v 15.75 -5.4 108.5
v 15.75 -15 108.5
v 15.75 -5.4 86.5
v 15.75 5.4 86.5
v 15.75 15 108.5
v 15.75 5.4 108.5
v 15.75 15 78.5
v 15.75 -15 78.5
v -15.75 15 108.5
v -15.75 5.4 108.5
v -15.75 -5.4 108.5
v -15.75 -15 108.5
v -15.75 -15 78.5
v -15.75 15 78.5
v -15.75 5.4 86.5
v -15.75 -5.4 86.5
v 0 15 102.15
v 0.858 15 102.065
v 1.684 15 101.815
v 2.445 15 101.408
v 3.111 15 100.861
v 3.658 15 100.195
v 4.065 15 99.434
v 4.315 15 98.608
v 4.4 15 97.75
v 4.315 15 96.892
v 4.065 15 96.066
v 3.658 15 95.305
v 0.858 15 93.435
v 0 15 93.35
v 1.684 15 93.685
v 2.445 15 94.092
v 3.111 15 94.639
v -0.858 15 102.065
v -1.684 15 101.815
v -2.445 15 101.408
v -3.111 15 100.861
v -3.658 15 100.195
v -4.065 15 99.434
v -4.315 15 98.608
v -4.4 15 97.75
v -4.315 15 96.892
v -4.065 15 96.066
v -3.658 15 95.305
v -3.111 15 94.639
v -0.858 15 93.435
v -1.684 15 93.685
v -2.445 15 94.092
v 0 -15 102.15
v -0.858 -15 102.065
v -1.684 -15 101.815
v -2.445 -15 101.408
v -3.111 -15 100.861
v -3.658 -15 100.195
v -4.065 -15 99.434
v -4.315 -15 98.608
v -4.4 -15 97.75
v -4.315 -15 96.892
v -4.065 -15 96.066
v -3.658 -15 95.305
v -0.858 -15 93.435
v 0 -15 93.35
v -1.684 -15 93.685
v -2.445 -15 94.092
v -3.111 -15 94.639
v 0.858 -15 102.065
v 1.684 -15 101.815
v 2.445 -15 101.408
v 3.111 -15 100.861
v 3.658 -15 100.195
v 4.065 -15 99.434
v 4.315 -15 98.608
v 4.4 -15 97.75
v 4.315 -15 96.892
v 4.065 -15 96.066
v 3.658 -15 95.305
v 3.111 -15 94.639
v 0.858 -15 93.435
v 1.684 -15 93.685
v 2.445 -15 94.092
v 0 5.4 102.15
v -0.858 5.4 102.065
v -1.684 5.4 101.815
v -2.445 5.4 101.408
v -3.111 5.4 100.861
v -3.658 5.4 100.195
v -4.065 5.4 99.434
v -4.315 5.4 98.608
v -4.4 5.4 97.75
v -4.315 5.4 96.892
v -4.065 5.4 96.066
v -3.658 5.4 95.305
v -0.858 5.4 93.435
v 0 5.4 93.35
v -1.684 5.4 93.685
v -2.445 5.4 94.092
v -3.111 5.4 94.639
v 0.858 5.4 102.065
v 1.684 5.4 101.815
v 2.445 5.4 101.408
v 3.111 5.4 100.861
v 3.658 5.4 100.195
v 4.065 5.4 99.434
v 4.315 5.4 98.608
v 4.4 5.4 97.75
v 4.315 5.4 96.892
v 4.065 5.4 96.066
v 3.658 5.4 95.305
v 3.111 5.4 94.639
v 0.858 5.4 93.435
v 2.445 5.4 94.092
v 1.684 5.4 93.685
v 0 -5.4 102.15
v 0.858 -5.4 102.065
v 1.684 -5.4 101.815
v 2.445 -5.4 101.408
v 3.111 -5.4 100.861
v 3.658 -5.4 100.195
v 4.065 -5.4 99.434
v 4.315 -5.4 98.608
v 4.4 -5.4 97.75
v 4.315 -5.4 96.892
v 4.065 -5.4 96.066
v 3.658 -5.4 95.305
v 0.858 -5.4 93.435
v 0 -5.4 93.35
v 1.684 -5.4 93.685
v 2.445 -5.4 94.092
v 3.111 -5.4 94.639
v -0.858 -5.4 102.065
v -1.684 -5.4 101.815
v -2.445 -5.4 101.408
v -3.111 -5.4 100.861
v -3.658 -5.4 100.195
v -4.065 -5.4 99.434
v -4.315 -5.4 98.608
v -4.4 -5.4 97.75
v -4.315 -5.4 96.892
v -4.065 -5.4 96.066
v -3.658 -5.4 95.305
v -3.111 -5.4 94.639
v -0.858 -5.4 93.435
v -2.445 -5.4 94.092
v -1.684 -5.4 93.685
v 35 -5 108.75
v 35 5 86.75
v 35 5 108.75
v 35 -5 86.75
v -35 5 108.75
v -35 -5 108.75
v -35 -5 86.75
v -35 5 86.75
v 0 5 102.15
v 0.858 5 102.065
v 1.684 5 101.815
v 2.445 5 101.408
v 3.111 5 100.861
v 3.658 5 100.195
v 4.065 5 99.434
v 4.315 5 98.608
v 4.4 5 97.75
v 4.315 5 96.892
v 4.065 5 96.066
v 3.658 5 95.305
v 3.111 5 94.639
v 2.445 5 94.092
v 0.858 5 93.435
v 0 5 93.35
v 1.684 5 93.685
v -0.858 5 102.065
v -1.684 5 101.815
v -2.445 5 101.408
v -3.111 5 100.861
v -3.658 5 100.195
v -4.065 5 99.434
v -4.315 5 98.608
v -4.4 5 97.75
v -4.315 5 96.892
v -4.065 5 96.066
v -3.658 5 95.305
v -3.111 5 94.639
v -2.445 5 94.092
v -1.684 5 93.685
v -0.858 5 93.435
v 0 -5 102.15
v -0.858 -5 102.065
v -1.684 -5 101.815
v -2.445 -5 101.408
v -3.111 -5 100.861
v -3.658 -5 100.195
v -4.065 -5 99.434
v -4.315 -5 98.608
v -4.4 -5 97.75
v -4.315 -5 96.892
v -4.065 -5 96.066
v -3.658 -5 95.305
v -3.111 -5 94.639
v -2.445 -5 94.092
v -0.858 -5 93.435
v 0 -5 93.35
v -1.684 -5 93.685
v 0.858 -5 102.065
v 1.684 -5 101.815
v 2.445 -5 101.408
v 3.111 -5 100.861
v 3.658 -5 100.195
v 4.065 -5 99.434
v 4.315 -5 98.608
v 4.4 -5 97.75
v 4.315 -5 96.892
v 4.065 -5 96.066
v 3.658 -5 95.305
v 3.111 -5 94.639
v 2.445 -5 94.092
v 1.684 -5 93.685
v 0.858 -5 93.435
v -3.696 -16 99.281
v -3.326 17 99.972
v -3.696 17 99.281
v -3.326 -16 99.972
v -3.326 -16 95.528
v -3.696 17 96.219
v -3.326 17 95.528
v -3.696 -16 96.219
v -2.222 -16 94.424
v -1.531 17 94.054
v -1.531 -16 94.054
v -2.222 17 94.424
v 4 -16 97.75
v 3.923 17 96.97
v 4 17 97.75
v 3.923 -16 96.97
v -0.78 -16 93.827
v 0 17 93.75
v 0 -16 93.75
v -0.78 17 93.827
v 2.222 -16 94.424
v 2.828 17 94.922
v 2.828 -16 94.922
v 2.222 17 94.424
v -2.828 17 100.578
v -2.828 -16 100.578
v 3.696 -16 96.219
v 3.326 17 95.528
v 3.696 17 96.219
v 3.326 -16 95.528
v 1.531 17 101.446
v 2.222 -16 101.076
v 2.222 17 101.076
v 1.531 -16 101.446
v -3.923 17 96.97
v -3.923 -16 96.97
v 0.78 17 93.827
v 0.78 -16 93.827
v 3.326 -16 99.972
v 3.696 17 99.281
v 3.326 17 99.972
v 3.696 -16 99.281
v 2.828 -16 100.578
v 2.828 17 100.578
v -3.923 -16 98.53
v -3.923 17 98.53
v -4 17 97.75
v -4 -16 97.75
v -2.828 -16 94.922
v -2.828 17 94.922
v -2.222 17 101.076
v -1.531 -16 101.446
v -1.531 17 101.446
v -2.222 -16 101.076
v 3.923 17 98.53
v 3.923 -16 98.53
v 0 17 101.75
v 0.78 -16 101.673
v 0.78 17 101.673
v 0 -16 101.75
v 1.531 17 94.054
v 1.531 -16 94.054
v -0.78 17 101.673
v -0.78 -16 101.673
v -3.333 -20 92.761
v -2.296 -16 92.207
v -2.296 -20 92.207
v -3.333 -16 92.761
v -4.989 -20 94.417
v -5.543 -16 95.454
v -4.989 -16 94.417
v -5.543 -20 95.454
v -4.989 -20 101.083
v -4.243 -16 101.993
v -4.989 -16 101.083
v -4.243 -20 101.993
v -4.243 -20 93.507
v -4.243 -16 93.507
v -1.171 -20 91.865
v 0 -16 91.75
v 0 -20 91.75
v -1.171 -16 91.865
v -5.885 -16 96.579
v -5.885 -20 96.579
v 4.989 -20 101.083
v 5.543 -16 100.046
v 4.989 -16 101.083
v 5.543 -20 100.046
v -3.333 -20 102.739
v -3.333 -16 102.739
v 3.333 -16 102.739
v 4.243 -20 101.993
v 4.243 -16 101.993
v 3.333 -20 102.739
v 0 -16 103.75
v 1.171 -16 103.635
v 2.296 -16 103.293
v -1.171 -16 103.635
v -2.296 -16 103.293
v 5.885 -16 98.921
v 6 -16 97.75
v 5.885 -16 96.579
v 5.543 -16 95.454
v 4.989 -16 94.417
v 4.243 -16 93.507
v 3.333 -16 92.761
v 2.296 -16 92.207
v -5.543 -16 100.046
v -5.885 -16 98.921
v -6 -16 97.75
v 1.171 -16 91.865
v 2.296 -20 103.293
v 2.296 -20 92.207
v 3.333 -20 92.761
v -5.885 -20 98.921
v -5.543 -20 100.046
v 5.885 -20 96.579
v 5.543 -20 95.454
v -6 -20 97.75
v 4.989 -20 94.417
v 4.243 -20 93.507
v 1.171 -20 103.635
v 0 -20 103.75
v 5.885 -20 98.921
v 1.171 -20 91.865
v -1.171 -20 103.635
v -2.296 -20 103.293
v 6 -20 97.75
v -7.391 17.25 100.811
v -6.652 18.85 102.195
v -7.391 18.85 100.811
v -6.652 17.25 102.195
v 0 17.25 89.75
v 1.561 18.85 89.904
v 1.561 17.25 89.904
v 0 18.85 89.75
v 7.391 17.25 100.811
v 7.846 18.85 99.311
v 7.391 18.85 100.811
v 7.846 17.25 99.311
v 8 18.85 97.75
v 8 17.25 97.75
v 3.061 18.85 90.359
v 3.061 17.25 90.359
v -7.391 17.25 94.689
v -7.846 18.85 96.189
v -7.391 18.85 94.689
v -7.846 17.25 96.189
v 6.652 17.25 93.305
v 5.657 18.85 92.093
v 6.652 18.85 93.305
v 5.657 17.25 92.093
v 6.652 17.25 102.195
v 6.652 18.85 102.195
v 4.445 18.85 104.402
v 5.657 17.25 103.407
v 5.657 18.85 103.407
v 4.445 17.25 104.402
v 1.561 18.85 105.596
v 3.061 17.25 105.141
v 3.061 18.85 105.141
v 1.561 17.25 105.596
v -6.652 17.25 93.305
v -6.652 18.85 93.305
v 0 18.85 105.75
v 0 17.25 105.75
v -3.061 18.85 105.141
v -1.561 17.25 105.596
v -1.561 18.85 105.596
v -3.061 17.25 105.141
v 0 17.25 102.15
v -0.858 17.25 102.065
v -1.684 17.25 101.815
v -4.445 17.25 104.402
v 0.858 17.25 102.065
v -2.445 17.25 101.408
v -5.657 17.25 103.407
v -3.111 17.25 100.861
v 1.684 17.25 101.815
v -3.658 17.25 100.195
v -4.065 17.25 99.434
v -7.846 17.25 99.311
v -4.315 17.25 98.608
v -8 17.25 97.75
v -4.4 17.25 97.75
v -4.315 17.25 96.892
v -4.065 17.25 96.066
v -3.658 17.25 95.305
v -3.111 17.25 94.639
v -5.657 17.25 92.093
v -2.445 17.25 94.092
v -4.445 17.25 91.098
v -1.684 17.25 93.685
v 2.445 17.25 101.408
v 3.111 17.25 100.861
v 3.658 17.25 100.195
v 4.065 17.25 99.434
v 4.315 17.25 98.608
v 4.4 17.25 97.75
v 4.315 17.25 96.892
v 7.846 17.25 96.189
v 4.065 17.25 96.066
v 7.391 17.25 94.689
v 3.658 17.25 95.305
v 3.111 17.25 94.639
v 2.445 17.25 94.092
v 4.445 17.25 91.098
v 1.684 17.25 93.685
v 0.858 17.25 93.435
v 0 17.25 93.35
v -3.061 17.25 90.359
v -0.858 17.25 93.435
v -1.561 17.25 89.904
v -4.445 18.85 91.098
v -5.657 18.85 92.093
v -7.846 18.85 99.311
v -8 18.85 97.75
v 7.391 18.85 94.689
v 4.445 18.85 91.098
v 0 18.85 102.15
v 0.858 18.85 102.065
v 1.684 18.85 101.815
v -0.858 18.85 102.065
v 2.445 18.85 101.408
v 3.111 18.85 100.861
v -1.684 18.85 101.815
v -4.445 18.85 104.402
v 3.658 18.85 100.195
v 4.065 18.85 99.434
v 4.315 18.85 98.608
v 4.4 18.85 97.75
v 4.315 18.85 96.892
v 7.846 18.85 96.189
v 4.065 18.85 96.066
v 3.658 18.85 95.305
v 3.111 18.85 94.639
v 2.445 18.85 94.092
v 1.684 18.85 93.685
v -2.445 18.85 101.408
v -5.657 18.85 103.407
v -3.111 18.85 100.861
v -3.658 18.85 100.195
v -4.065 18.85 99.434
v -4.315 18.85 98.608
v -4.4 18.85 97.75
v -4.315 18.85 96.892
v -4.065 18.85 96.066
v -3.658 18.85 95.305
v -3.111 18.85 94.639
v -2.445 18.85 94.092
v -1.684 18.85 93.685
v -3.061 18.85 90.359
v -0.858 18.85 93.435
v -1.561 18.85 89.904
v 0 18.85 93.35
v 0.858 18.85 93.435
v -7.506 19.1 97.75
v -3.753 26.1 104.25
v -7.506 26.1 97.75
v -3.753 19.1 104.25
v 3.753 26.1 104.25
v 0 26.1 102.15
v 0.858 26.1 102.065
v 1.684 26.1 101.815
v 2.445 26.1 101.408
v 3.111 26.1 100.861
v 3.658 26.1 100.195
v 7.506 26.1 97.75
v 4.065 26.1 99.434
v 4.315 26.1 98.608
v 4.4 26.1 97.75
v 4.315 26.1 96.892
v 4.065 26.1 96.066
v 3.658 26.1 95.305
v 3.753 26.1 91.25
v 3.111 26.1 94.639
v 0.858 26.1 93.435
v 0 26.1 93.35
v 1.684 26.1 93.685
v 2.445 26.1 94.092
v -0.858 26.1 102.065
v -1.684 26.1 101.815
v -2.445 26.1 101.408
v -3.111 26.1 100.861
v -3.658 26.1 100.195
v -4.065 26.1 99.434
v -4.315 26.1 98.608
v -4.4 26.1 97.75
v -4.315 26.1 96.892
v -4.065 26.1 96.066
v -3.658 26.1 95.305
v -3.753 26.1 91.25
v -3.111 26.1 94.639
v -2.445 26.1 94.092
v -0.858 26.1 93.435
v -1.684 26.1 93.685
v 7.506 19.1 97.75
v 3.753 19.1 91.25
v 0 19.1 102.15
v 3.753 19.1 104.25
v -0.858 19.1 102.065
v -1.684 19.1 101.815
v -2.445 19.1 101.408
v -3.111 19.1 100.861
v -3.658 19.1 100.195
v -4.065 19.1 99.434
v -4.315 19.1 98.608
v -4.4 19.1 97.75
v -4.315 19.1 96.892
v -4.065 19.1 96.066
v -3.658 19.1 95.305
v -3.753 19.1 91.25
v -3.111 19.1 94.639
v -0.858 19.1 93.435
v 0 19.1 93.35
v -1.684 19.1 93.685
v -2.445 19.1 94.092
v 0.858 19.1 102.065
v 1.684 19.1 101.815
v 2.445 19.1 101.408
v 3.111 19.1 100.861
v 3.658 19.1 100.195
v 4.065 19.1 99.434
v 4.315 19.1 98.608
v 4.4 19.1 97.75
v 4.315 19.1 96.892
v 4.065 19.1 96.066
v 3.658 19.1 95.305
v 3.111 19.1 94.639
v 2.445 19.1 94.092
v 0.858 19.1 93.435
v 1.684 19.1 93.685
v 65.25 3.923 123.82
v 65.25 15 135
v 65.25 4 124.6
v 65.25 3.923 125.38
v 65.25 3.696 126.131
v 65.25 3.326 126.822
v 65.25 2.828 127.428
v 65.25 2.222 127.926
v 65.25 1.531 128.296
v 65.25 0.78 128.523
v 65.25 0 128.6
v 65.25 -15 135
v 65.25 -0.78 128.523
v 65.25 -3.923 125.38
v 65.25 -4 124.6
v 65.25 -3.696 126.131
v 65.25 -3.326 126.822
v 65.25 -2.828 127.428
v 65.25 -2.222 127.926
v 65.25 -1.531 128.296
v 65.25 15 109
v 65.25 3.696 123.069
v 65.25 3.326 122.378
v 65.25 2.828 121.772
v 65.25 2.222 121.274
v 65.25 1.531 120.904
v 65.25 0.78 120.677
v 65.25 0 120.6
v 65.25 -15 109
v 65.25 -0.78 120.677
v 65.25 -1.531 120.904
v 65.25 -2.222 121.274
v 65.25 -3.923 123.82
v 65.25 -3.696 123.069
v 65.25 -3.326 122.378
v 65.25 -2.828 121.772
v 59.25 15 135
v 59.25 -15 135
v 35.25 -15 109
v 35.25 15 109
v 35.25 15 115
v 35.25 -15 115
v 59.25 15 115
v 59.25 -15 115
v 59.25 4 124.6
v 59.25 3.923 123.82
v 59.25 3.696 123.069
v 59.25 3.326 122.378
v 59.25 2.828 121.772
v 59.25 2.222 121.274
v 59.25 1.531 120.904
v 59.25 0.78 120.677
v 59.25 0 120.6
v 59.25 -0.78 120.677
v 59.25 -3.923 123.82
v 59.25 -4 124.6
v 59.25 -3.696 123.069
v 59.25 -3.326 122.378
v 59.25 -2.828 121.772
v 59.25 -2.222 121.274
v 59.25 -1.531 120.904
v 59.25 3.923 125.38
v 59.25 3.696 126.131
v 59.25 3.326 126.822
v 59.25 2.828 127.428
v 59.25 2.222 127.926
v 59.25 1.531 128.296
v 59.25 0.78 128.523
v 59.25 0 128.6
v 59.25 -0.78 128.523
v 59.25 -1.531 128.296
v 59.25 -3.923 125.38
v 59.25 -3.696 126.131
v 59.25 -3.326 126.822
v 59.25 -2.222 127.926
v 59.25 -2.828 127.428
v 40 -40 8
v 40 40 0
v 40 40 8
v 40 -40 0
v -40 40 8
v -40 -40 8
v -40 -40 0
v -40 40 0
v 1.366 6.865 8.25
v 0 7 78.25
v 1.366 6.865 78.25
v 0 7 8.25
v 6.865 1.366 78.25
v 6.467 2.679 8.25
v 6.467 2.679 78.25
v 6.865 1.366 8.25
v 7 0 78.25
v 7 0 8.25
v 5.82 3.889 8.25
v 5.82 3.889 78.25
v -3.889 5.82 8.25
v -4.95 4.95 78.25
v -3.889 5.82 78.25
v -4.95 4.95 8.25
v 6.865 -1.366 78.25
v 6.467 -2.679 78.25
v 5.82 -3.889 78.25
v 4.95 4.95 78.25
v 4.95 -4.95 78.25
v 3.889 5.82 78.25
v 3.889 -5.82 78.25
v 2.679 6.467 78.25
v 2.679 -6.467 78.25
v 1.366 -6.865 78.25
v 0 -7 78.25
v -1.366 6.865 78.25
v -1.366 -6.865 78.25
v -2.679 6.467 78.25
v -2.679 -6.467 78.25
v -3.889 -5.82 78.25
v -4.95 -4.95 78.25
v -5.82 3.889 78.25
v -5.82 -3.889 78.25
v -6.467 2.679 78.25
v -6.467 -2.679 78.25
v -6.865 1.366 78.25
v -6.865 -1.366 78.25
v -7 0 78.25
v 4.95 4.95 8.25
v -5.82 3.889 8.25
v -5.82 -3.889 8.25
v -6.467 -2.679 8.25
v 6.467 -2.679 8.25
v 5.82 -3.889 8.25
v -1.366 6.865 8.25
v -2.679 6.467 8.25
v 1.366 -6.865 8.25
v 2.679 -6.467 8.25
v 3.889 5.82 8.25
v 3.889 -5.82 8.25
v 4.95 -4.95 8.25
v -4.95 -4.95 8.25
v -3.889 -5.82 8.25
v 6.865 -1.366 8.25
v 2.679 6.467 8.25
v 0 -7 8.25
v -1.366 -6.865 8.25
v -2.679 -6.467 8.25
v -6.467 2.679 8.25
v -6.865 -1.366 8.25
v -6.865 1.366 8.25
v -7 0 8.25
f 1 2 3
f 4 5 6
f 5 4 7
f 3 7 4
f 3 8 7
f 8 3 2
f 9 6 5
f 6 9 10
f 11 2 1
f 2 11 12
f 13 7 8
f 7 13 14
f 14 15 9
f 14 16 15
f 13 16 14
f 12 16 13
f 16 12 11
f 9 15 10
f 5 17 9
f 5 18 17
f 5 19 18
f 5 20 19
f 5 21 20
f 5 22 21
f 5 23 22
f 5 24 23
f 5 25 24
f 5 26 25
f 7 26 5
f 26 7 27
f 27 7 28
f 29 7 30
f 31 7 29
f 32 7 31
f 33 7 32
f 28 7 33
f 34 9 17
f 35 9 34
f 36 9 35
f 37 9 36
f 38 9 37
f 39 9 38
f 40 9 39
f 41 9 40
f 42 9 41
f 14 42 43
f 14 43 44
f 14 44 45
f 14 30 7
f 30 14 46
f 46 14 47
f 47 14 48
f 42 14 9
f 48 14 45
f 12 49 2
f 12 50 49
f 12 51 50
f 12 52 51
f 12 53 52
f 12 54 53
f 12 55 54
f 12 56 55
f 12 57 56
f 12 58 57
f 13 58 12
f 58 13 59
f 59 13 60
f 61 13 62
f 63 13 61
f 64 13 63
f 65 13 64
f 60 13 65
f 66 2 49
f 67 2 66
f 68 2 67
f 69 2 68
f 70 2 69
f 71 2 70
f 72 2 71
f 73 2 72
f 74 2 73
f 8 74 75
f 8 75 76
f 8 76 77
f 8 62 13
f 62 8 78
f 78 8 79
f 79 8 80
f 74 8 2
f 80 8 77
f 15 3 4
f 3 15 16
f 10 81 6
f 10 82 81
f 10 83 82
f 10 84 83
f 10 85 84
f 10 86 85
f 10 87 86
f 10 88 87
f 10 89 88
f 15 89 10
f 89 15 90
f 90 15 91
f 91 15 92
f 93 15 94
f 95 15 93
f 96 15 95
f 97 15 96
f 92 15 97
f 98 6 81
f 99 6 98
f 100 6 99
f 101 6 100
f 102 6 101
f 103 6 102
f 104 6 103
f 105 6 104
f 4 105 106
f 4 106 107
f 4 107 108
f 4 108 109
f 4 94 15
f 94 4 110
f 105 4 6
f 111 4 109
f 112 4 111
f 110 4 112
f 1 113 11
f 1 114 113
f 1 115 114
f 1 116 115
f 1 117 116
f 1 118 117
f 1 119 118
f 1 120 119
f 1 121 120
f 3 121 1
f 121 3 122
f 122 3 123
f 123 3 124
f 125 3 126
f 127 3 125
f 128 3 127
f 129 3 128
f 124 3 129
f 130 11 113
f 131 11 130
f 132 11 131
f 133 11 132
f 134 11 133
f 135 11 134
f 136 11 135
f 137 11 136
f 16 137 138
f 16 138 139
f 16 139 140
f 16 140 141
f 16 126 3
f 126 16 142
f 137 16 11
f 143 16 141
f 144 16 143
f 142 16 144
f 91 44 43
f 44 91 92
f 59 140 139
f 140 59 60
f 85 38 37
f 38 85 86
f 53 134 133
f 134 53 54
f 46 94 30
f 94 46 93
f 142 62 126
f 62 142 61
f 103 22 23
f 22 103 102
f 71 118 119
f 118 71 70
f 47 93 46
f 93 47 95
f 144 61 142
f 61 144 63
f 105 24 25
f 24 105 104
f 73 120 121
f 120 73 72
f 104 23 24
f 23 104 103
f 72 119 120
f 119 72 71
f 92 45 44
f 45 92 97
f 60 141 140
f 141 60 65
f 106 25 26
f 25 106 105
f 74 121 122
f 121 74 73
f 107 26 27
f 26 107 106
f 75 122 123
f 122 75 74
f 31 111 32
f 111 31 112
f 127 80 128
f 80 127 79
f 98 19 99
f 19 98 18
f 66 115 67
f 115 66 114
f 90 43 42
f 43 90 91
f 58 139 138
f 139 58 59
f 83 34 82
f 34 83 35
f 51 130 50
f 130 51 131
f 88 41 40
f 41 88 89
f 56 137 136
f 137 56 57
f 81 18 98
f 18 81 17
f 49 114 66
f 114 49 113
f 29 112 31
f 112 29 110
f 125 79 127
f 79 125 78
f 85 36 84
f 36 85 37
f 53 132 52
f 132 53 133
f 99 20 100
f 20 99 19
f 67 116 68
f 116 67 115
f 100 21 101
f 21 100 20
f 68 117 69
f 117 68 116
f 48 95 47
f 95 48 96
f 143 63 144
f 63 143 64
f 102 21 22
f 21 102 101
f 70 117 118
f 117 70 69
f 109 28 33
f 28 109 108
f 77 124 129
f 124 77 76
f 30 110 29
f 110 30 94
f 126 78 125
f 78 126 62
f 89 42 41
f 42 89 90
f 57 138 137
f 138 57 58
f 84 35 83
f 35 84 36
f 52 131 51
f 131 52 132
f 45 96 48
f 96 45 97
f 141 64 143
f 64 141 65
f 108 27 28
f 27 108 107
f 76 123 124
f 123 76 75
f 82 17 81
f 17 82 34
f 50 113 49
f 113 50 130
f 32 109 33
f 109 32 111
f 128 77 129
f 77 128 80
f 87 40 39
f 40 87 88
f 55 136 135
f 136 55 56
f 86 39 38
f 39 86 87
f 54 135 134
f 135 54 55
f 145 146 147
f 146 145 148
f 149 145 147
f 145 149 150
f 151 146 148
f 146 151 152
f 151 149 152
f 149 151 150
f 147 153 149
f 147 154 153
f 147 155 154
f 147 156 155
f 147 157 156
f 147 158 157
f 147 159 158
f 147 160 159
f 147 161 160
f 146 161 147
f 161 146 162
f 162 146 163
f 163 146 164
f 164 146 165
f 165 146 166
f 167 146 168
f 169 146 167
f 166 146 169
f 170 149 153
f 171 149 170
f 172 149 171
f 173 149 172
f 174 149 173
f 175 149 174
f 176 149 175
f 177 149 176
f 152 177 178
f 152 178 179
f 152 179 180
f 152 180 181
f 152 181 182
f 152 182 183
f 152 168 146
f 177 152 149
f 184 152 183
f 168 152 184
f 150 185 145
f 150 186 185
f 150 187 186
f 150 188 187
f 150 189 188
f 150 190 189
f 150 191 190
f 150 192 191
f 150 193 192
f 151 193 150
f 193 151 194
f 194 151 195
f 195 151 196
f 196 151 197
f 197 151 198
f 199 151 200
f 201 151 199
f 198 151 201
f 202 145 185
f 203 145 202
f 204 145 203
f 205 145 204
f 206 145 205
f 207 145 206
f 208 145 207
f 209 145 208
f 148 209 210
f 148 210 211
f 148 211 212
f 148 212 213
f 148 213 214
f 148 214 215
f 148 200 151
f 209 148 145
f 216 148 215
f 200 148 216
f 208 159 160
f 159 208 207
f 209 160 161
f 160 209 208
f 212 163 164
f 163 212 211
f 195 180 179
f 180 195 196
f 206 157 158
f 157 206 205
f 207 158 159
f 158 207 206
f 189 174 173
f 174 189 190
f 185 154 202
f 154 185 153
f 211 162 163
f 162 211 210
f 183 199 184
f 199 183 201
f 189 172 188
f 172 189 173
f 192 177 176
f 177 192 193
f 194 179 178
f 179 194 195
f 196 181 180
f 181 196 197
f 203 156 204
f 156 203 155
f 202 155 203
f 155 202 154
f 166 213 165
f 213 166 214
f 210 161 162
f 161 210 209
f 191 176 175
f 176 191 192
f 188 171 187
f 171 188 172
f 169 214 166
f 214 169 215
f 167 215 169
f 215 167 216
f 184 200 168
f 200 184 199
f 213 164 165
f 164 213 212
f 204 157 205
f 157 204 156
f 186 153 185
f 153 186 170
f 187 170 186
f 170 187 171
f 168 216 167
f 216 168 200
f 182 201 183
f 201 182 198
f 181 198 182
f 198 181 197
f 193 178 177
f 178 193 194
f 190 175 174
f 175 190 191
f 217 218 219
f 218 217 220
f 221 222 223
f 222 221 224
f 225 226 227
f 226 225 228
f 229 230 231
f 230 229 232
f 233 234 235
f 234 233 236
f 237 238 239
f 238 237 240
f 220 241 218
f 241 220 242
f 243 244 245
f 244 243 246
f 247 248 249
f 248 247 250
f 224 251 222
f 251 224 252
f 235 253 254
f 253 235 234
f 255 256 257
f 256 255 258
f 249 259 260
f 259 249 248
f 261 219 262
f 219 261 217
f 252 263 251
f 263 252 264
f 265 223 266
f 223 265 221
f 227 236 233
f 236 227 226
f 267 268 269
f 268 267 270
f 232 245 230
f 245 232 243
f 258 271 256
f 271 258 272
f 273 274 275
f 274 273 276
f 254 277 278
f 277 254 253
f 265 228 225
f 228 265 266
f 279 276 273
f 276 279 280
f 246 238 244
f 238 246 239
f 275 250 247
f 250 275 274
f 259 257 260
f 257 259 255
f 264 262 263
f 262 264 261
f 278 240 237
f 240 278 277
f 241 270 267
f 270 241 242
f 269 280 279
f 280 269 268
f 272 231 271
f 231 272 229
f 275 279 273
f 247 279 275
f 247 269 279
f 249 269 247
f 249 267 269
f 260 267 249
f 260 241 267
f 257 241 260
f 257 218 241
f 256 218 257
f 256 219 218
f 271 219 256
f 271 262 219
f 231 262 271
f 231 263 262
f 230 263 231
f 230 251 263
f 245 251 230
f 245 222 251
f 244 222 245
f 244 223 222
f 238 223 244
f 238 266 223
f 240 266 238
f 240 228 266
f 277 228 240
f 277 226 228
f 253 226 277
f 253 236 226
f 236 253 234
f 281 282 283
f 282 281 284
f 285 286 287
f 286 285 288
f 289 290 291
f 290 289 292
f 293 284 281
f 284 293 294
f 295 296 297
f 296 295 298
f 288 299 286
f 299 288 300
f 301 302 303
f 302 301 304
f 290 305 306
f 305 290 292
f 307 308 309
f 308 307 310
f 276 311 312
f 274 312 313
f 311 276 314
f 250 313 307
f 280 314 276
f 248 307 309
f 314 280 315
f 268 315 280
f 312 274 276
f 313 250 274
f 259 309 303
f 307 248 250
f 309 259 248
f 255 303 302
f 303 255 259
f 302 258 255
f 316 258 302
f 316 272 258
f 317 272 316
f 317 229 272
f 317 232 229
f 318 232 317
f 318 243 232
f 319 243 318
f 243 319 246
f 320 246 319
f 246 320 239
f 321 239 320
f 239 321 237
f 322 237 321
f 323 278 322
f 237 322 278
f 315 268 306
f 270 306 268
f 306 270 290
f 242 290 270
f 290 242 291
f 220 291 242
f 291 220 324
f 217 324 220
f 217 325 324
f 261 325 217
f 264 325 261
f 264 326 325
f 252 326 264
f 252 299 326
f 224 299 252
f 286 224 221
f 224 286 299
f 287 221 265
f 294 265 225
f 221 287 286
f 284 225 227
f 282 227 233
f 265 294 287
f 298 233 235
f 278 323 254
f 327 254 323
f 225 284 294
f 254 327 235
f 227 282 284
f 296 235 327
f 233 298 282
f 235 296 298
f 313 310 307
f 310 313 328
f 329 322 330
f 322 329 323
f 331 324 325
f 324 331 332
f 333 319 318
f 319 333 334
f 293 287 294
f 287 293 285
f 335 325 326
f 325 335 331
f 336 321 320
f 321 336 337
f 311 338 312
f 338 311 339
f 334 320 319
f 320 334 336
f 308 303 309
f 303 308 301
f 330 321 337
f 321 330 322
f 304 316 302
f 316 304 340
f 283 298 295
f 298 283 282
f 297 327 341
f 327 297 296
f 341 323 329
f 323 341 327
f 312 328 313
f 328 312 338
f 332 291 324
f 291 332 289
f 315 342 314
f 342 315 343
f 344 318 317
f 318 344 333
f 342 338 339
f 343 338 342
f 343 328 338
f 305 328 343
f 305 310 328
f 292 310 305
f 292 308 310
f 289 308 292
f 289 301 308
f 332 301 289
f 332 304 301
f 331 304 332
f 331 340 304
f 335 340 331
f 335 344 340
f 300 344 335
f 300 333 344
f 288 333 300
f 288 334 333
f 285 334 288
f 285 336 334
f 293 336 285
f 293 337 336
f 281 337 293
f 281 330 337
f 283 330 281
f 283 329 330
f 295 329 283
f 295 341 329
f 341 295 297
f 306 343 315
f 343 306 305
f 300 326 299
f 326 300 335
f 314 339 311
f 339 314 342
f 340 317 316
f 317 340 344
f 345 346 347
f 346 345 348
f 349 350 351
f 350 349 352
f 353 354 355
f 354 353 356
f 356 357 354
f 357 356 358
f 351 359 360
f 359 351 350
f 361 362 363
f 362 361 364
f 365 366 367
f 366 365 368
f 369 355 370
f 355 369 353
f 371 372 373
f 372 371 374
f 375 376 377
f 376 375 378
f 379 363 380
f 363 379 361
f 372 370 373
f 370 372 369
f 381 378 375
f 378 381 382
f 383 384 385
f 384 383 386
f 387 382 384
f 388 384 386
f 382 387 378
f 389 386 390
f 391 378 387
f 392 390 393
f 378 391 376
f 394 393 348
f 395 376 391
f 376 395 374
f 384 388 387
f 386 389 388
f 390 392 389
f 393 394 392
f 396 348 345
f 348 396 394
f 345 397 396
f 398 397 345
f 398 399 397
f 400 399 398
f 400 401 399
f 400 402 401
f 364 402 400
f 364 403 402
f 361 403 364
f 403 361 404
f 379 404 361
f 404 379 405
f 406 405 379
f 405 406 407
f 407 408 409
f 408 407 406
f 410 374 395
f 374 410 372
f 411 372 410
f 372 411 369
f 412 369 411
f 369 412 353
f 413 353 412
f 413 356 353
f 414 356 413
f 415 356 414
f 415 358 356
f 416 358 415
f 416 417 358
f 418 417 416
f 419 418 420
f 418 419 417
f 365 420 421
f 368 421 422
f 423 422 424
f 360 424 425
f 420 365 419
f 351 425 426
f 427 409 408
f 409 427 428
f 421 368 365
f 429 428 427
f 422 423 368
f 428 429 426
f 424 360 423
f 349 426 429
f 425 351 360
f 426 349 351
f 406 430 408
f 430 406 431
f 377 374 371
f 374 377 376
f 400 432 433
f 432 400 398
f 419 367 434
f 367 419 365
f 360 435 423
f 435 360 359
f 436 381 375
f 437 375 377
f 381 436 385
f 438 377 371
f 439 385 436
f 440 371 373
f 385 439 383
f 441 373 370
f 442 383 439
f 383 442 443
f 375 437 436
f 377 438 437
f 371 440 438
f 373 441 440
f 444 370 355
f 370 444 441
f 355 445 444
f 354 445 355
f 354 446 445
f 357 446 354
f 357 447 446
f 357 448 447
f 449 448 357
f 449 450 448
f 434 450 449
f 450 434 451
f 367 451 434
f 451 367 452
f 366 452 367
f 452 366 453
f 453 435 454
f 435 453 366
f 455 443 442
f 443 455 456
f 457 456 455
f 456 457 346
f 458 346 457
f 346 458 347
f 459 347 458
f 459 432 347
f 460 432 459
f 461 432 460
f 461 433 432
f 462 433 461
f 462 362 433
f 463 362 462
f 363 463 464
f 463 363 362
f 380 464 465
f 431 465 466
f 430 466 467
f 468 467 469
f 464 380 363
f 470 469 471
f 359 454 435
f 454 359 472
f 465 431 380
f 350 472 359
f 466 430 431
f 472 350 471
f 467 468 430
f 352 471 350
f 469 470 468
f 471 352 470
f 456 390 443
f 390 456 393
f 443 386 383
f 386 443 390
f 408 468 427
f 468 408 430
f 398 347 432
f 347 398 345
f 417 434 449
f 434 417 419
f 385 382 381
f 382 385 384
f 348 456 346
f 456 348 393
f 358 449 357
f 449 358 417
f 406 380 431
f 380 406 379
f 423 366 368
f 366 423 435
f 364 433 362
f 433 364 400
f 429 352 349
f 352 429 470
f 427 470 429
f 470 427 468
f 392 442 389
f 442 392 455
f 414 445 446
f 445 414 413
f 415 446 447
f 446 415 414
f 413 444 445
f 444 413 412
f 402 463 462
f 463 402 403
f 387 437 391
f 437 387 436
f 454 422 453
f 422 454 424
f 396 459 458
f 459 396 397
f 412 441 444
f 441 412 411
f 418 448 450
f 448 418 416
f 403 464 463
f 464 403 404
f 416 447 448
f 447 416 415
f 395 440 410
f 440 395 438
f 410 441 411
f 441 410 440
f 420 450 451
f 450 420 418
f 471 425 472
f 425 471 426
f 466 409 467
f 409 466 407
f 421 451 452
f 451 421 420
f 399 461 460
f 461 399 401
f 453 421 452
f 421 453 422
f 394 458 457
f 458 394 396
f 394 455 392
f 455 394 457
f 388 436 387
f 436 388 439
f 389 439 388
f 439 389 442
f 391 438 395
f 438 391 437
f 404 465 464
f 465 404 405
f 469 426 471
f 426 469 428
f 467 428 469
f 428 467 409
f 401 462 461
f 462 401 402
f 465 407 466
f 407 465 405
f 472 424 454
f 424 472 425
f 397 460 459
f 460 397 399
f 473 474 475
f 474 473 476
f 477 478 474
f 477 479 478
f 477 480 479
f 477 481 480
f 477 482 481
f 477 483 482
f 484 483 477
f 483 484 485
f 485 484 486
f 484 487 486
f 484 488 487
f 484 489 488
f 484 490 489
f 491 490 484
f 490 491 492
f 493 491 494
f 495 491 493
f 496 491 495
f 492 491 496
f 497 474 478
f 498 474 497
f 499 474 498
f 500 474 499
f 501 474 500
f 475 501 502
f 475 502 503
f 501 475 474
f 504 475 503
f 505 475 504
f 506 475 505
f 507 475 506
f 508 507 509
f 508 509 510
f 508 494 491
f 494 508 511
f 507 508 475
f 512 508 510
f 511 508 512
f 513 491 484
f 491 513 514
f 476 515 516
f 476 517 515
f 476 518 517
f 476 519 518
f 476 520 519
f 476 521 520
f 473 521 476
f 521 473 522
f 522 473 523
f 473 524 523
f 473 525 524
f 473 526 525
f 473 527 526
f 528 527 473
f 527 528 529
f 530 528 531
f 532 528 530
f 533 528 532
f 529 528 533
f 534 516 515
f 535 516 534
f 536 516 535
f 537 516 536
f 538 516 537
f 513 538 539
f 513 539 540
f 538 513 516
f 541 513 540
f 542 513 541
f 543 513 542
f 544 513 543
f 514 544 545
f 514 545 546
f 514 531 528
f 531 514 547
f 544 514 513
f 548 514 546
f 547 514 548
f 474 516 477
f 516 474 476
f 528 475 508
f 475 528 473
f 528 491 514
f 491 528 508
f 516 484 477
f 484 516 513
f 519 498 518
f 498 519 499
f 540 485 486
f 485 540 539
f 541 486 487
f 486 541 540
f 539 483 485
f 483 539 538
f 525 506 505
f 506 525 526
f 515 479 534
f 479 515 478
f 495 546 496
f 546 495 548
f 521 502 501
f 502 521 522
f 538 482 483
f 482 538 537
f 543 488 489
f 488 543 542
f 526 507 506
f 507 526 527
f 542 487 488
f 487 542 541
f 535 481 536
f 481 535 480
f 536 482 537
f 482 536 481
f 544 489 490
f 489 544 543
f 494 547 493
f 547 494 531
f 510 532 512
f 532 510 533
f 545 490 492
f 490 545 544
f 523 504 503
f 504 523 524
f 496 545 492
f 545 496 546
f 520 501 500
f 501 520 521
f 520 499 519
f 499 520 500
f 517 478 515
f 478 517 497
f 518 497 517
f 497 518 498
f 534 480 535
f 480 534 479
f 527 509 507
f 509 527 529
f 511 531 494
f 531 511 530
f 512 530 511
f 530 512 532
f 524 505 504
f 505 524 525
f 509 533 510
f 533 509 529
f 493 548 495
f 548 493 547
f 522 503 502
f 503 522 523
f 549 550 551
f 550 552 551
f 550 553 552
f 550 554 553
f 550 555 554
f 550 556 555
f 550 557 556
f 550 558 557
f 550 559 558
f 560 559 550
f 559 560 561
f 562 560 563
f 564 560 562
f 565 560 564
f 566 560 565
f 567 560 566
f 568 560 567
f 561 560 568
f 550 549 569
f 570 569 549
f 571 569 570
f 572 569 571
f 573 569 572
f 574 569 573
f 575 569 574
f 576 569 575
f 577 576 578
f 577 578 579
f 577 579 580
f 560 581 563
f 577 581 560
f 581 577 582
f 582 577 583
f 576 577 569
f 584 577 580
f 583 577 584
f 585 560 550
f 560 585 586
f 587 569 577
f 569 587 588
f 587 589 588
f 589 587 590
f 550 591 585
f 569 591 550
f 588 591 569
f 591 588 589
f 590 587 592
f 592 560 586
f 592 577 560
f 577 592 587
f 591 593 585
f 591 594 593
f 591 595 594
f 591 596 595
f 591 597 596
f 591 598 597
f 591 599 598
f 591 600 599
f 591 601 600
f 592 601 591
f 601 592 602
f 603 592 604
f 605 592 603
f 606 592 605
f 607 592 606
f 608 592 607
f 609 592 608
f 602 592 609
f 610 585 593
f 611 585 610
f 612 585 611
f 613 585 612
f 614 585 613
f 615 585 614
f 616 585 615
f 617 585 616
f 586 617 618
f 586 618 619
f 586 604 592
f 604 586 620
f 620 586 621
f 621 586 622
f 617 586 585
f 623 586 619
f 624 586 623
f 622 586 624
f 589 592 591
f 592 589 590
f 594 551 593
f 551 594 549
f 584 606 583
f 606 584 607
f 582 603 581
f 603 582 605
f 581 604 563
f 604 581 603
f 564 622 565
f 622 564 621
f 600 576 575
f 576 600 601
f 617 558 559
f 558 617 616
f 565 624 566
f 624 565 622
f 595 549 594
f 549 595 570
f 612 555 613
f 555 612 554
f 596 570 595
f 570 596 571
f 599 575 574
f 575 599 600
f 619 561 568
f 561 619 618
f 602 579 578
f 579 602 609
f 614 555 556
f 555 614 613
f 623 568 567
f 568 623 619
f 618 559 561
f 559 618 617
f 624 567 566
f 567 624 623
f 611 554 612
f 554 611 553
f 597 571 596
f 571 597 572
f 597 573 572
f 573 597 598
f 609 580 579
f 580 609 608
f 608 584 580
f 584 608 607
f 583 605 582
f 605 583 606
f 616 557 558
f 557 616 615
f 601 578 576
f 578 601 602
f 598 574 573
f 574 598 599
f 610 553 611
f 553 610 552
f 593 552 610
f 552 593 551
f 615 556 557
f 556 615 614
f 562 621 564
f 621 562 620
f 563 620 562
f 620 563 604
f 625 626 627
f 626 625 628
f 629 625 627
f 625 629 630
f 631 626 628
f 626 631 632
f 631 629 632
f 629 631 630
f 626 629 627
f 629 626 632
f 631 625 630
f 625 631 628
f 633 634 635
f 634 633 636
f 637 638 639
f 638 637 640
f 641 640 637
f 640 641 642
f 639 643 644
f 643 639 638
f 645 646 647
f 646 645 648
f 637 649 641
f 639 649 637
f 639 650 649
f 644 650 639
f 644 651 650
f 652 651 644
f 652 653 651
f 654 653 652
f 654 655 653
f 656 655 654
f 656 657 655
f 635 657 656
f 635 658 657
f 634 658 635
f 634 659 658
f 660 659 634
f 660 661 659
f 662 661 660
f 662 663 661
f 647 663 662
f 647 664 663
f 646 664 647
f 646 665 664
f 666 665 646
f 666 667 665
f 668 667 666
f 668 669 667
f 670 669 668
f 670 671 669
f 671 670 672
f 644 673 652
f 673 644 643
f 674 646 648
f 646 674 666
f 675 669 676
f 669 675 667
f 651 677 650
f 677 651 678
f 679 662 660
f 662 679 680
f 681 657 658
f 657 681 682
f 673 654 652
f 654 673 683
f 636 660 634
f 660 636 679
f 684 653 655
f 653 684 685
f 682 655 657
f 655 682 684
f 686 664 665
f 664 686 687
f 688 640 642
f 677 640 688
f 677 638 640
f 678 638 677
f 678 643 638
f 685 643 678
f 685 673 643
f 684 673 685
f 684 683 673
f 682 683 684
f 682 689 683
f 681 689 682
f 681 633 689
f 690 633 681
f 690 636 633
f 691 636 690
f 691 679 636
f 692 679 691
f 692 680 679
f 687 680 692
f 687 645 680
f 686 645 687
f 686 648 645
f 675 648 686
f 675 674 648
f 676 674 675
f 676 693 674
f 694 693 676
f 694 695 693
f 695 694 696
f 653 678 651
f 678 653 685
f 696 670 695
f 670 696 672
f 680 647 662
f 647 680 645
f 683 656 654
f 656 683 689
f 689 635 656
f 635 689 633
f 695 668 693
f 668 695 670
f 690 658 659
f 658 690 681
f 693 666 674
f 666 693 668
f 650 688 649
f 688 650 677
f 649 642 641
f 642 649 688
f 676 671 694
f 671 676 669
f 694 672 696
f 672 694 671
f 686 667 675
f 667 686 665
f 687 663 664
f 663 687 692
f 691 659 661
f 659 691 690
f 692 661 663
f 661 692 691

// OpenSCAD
$fn = 32;

// ------------------------------------------------------------------------
// Lamp arm: column d14 x 70 mm, arm 70 mm
// Every part is its own module, assembly() places every instance.
// ------------------------------------------------------------------------

// --- part 1 ---
module lamp_base() {
  difference() {
    translate([-40, -40, 0]) cube([80, 80, 8]);
  }
}

// --- part 2 ---
module lamp_column() {
  cylinder(h = 70, d = 14);
}

// --- part 3 ---
module head_fork() {
  difference() {
    translate([-15.75, -15, 0]) cube([31.5, 30, 30]);
    translate([-16.75, -5.4, 8]) cube([33.5, 10.8, 23]);
    translate([0, 0, 19.25]) rotate([90, 0, 0]) cylinder(h = 32, d = 8.8, center = true);
  }
}

// --- part 4 ---
module lamp_arm() {
  difference() {
    translate([-35, -5, 0]) cube([70, 10, 22]);
    translate([0, 0, 11]) rotate([90, 0, 0]) cylinder(h = 12, d = 8.8, center = true);
  }
}

// --- part 5 ---
module arm_pin() {
  rotate([0, 90, 0]) cylinder(h = 34, d = 8, center = true);
  translate([-20, 0, 0]) rotate([0, 90, 0]) cylinder(h = 4, d = 12);
}

// --- part 6 ---
module arm_washer() {
  difference() {
      translate([0, 0, 0]) cylinder(h = 1.6, d = 16);
      translate([0, 0, -1]) cylinder(h = 3.6, d = 8.8);
    }
}

// --- part 7 ---
module arm_nut() {
  difference() {
    linear_extrude(height = 7) polygon(points = [[7.506, 0], [3.753, 6.5], [-3.753, 6.5], [-7.506, 0], [-3.753, -6.5], [3.753, -6.5]]);
    translate([0, 0, -1]) cylinder(h = 9, d = 8.8);
  }
}

// --- part 8 ---
module shade_bracket() {
  difference() {
    translate([-15, -15, 0]) cube([30, 30, 26]);
    translate([-16, -16, 6]) cube([25, 32, 21]);
    translate([12, 0, 15.6]) rotate([0, 90, 0]) cylinder(h = 8, d = 8, center = true);
  }
}

// --- assembly ---
module assembly() {
  color([0.80, 0.24, 0.20]) translate([0, 0, 0]) rotate([0, 0, 0]) lamp_base();
  color([0.20, 0.45, 0.75]) translate([0, 0, 8.25]) rotate([0, 0, 0]) lamp_column();
  color([0.25, 0.62, 0.32]) translate([0, 0, 78.5]) rotate([0, 0, 0]) head_fork();
  color([0.92, 0.70, 0.18]) translate([0, 0, 86.75]) rotate([0, 0, 0]) lamp_arm();
  color([0.58, 0.35, 0.70]) translate([0, 0, 97.75]) rotate([0, 0, 90]) arm_pin();
  color([0.16, 0.66, 0.66]) translate([0, 18.85, 97.75]) rotate([90, 0, 0]) arm_washer();
  color([0.85, 0.48, 0.18]) translate([0, 26.1, 97.75]) rotate([90, 0, 0]) arm_nut();
  color([0.55, 0.60, 0.65]) translate([50.25, 0, 109]) rotate([0, 0, 0]) shade_bracket();
}

assembly();
